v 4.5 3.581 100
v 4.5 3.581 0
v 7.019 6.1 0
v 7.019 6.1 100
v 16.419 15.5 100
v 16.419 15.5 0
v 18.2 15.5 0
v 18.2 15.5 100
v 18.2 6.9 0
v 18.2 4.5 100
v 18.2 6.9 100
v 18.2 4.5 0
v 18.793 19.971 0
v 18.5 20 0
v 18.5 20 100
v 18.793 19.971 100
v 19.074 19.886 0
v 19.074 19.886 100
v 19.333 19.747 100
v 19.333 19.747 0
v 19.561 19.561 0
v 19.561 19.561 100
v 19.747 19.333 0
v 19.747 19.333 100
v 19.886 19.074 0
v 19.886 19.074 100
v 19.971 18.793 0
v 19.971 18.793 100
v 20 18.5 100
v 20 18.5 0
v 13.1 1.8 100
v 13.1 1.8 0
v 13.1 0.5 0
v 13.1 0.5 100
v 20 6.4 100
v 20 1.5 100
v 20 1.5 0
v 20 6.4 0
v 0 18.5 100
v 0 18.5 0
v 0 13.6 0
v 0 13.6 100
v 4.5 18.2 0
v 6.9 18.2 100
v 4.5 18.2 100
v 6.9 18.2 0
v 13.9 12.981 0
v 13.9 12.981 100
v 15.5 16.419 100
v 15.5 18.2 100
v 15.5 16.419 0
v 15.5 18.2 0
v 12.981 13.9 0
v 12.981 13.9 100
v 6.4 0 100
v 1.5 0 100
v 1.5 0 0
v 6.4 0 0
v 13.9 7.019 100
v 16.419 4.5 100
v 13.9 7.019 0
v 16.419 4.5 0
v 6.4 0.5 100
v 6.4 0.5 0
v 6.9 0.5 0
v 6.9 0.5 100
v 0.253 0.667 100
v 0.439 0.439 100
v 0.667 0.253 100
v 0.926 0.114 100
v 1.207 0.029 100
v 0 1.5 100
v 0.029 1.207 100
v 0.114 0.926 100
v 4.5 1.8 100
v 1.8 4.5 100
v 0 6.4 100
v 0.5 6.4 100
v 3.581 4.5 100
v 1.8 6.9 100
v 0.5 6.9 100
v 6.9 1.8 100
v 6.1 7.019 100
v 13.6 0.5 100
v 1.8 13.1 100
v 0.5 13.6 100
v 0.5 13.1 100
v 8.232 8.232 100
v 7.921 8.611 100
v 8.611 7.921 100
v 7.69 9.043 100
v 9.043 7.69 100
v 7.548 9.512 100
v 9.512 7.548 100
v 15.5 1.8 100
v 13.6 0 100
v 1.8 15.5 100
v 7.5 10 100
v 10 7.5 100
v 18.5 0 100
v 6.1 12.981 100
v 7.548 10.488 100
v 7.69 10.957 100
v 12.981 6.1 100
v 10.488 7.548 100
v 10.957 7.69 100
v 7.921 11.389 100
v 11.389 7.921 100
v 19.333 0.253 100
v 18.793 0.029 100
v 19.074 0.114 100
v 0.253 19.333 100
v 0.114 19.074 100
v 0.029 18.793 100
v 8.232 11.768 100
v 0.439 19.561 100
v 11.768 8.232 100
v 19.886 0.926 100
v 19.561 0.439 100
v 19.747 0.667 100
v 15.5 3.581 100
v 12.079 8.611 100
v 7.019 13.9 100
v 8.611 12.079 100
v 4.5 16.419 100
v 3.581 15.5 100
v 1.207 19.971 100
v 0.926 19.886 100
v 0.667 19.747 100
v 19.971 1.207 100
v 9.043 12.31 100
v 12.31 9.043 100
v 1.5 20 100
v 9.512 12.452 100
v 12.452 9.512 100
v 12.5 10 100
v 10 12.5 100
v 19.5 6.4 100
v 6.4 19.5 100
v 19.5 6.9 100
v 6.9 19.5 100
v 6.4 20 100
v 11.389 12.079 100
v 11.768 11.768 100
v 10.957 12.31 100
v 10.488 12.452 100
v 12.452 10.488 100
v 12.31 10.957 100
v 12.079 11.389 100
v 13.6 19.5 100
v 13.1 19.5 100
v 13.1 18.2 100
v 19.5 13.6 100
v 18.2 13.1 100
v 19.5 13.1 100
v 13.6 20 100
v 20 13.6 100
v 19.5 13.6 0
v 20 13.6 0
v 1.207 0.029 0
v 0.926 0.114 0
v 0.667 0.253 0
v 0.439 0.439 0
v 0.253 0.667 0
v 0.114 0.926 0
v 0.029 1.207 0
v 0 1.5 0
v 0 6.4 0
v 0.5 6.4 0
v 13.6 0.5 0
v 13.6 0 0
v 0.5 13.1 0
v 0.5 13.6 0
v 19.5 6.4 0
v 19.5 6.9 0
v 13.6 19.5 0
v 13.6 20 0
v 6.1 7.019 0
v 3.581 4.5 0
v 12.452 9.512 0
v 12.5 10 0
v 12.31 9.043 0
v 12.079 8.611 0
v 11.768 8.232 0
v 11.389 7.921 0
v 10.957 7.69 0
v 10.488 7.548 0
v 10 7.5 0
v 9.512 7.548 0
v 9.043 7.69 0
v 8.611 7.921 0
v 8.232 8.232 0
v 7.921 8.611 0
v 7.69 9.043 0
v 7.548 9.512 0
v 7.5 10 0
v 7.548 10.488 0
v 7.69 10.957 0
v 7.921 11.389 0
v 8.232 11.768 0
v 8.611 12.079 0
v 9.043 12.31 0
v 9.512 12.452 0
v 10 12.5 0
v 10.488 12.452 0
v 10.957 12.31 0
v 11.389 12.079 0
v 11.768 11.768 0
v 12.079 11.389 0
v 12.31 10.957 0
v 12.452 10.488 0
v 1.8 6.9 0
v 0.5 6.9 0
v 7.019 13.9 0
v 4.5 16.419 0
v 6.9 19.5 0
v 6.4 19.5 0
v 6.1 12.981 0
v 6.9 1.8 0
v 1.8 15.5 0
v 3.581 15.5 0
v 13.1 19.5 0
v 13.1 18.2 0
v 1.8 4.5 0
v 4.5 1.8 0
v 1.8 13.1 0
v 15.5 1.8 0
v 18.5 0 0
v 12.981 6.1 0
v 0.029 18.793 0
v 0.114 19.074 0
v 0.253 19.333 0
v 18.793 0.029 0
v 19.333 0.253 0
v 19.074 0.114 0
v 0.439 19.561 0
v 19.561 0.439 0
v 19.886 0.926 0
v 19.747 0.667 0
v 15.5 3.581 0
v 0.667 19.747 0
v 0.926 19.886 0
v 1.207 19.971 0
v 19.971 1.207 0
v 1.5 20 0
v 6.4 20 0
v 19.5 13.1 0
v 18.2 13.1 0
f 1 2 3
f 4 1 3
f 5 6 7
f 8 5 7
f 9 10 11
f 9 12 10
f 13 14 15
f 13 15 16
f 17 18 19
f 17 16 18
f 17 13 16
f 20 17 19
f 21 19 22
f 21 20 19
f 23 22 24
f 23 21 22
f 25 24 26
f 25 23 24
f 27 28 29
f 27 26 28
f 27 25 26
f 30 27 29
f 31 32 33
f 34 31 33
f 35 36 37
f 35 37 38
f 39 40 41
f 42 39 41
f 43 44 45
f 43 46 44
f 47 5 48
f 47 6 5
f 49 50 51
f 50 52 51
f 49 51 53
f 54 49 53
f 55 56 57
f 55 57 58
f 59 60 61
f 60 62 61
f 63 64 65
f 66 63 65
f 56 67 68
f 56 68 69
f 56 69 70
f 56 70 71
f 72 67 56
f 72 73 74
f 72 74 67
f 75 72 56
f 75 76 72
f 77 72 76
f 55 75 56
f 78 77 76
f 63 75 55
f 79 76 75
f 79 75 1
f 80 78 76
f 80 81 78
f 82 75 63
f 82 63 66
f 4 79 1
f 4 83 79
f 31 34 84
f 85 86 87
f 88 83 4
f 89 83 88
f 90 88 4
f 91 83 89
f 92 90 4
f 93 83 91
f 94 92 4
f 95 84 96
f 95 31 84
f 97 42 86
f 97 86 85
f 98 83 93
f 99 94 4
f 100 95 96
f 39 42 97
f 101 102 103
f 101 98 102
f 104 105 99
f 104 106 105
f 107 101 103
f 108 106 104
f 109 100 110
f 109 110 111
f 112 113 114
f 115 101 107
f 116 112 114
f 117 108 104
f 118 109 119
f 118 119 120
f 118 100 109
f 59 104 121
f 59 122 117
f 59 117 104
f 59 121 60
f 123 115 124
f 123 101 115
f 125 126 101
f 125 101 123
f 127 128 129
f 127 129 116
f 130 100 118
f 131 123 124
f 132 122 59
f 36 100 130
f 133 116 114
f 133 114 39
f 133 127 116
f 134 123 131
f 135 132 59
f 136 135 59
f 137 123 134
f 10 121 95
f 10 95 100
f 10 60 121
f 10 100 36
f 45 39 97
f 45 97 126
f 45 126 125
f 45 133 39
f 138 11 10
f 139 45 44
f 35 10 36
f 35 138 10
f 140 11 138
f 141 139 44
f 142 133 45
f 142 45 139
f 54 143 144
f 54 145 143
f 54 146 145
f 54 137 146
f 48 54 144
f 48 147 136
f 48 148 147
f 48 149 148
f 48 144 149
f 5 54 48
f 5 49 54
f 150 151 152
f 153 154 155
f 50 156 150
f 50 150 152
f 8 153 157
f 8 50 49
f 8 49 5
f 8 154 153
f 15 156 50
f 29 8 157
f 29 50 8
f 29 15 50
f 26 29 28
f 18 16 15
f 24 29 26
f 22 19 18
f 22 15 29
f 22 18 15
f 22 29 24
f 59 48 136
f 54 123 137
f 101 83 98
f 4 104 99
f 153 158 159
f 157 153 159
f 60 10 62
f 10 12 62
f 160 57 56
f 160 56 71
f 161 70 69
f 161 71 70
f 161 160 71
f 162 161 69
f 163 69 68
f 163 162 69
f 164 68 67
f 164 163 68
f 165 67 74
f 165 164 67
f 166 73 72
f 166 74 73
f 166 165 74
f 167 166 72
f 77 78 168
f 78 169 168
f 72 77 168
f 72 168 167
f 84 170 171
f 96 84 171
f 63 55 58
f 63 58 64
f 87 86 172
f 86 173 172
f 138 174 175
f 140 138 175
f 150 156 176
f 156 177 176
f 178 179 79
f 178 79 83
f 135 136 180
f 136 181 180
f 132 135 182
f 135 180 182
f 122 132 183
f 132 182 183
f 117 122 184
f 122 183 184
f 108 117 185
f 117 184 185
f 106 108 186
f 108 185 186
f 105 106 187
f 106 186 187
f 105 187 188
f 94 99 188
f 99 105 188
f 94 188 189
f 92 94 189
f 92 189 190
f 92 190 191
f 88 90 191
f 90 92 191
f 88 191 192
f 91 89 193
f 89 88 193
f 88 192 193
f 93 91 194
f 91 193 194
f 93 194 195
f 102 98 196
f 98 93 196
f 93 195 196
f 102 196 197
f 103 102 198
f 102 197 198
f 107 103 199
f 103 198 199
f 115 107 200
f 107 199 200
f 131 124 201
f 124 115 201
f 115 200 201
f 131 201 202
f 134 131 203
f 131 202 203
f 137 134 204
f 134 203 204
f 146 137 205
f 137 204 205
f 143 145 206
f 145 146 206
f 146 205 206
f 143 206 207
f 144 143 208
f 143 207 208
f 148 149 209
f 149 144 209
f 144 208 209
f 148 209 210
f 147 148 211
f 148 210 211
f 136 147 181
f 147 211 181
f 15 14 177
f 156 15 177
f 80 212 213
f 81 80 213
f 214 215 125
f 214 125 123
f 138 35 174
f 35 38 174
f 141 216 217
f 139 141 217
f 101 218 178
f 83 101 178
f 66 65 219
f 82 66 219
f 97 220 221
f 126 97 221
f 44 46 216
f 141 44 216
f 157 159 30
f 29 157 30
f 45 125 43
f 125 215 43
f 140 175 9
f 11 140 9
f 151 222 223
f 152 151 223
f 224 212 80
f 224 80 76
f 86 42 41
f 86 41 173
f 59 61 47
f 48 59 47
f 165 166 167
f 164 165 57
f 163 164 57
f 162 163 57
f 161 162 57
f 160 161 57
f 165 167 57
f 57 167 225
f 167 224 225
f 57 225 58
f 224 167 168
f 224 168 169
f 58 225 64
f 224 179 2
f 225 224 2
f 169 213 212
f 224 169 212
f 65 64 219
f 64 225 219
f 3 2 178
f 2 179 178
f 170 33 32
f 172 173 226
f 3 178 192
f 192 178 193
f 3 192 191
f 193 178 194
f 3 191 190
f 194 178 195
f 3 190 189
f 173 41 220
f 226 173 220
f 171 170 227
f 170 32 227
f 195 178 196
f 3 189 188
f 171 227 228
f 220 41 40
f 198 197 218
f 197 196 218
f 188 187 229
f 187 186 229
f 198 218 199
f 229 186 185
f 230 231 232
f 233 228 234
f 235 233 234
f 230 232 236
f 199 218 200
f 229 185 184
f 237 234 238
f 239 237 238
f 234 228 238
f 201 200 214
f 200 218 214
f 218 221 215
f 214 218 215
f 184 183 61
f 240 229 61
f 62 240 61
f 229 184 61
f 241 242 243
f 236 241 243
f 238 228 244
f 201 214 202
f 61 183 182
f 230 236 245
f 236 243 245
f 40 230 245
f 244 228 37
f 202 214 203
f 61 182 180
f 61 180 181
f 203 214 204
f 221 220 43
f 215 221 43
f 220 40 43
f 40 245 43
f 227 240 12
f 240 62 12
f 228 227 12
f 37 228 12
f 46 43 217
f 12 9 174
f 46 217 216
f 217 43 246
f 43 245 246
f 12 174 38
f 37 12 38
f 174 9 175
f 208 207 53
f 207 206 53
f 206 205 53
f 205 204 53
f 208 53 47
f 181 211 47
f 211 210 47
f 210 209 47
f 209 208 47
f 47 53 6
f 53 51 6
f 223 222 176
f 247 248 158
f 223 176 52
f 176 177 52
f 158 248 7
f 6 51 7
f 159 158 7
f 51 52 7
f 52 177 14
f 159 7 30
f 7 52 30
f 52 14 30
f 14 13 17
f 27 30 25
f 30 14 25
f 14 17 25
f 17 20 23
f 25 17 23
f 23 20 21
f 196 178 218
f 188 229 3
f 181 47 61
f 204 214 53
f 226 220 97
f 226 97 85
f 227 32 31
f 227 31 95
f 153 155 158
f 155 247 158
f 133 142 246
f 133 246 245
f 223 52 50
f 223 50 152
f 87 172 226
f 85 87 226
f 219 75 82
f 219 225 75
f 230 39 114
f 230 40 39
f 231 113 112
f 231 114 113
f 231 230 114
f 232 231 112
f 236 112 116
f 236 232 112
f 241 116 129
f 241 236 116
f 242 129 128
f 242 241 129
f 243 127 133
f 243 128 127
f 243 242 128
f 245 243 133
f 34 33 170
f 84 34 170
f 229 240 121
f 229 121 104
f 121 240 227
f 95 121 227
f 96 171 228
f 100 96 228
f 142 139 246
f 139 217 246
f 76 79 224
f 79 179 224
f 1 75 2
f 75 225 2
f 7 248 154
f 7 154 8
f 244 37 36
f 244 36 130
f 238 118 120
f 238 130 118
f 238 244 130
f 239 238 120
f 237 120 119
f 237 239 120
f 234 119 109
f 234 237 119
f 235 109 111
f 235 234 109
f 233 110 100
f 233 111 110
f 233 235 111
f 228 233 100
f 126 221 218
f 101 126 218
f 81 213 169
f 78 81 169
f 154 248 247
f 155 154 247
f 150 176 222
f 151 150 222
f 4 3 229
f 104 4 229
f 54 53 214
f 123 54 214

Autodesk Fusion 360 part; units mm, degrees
sketch "Sketch1" plane through (0, 0, 0) normal (0, 0, 1) x (1, 0, 0)
  circle A0 centre (10, 10) radius 2.5
  line L0 (13.9, 6.1) -> (6.1, 13.9) construction
  line L1 (0, 6.4) -> (0, 1.5)
  line L2 (4.5, 1.8) -> (6.9, 1.8)
  line L3 (3.5808, 4.5) -> (6.1, 7.0192)
  line L4 (4.5, 3.5808) -> (7.0192, 6.1)
  line L5 (0.5, 6.9) -> (0.5, 6.4)
  line L6 (0.5, 6.4) -> (0, 6.4)
  line L7 (6.9, 0) -> (6.4, 0) construction
  line L8 (6.4, 0) -> (6.4, 0.5)
  line L9 (6.4, 0.5) -> (6.9, 0.5)
  arc A1 (0, 1.5) -> (1.5, 0) centre (1.5, 1.5) ccw
  line L10 (1.8, 6.9) -> (0.5, 6.9)
  line L11 (1.8, 6.9) -> (1.8, 6.4)
  line L12 (1.8, 6.4) -> (1.8, 4.5)
  line L13 (3.5808, 4.5) -> (1.8, 4.5)
  line L14 (6.1, 10) -> (6.1, 7.0192)
  line L15 (7.0192, 6.1) -> (10, 6.1)
  line L16 (4.5, 1.8) -> (4.5, 3.5808)
  line L17 (6.9, 0.5) -> (6.9, 1.8)
  line L18 (1.5, 0) -> (6.4, 0)
  line L19 (6.4, 0) -> (6.9, 0)
  line L20 (0, 6.9) -> (0, 6.4)
  line L21 (10, 13.9) -> (10, 6.1) construction
  line L22 (13.9, 10) -> (6.1, 10) construction
  line L23 (20, 6.4) -> (19.5, 6.4)
  line L24 (19.5, 6.4) -> (19.5, 6.9)
  line L25 (19.5, 6.9) -> (18.2, 6.9)
  line L26 (18.2, 4.5) -> (18.2, 6.9)
  line L27 (18.2, 4.5) -> (16.4192, 4.5)
  line L28 (16.4192, 4.5) -> (13.9, 7.0192)
  line L29 (13.9, 7.0192) -> (13.9, 10)
  line L30 (15.5, 3.5808) -> (12.9808, 6.1)
  line L31 (15.5, 3.5808) -> (15.5, 1.8)
  line L32 (13.6, 1.8) -> (15.5, 1.8)
  line L33 (13.1, 1.8) -> (13.6, 1.8)
  line L34 (13.1, 1.8) -> (13.1, 0.5)
  line L35 (13.1, 0.5) -> (13.6, 0.5)
  line L36 (13.6, 0.5) -> (13.6, 0)
  line L37 (10, 6.1) -> (12.9808, 6.1)
  line L38 (13.6, 0) -> (18.5, 0)
  arc A2 (18.5, 0) -> (20, 1.5) centre (18.5, 1.5) ccw
  line L39 (20, 1.5) -> (20, 6.4)
  line L40 (13.6, 20) -> (13.6, 19.5)
  line L41 (13.6, 19.5) -> (13.1, 19.5)
  line L42 (13.1, 19.5) -> (13.1, 18.2)
  line L43 (15.5, 18.2) -> (13.1, 18.2)
  line L44 (15.5, 18.2) -> (15.5, 16.4192)
  line L45 (15.5, 16.4192) -> (12.9808, 13.9)
  line L46 (12.9808, 13.9) -> (10, 13.9)
  line L47 (16.4192, 15.5) -> (13.9, 12.9808)
  line L48 (16.4192, 15.5) -> (18.2, 15.5)
  line L49 (18.2, 13.6) -> (18.2, 15.5)
  line L50 (18.2, 13.1) -> (18.2, 13.6)
  line L51 (18.2, 13.1) -> (19.5, 13.1)
  line L52 (19.5, 13.1) -> (19.5, 13.6)
  line L53 (19.5, 13.6) -> (20, 13.6)
  line L54 (13.9, 10) -> (13.9, 12.9808)
  line L55 (20, 13.6) -> (20, 18.5)
  arc A3 (20, 18.5) -> (18.5, 20) centre (18.5, 18.5) ccw
  line L56 (18.5, 20) -> (13.6, 20)
  line L57 (0, 13.6) -> (0.5, 13.6)
  line L58 (0.5, 13.6) -> (0.5, 13.1)
  line L59 (0.5, 13.1) -> (1.8, 13.1)
  line L60 (1.8, 15.5) -> (1.8, 13.1)
  line L61 (1.8, 15.5) -> (3.5808, 15.5)
  line L62 (3.5808, 15.5) -> (6.1, 12.9808)
  line L63 (6.1, 12.9808) -> (6.1, 10)
  line L64 (4.5, 16.4192) -> (7.0192, 13.9)
  line L65 (4.5, 16.4192) -> (4.5, 18.2)
  line L66 (6.4, 18.2) -> (4.5, 18.2)
  line L67 (6.9, 18.2) -> (6.4, 18.2)
  line L68 (6.9, 18.2) -> (6.9, 19.5)
  line L69 (6.9, 19.5) -> (6.4, 19.5)
  line L70 (6.4, 19.5) -> (6.4, 20)
  line L71 (10, 13.9) -> (7.0192, 13.9)
  line L72 (6.4, 20) -> (1.5, 20)
  arc A4 (1.5, 20) -> (0, 18.5) centre (1.5, 18.5) ccw
  line L73 (0, 18.5) -> (0, 13.6)
  arc A5 (26, 1.5) -> (27.5, 0) centre (27.5, 1.5) ccw
  line L74 (41.5, 3.5808) -> (41.5, 1.8)
  line L75 (39.1, 19.5) -> (39.1, 18.2)
  line L76 (32.4, 20) -> (27.5, 20)
  line L77 (26, 6.9) -> (26, 6.4)
  line L78 (29.5808, 4.5) -> (32.1, 7.0192)
  line L79 (29.5808, 15.5) -> (32.1, 12.9808)
  line L80 (26, 13.6) -> (26.5, 13.6)
  line L81 (39.1, 0.5) -> (39.6, 0.5)
  line L82 (30.5, 16.4192) -> (30.5, 18.2)
  line L83 (27.8, 15.5) -> (27.8, 13.1)
  line L84 (36, 13.9) -> (36, 6.1) construction
  line L85 (32.4, 0) -> (32.4, 0.5)
  line L86 (39.6, 0.5) -> (39.6, 0)
  line L87 (32.1, 10) -> (32.1, 7.0192)
  line L88 (32.4, 19.5) -> (32.4, 20)
  line L89 (39.1, 1.8) -> (39.6, 1.8)
  line L90 (27.8, 6.9) -> (27.8, 6.4)
  line L91 (41.5, 16.4192) -> (38.9808, 13.9)
  line L92 (26.5, 13.1) -> (27.8, 13.1)
  line L93 (26.5, 6.4) -> (26, 6.4)
  line L94 (32.1, 12.9808) -> (32.1, 10)
  line L95 (27.5, 0) -> (32.4, 0)
  line L96 (32.9, 0.5) -> (32.9, 1.8)
  line L97 (32.9, 0) -> (32.4, 0) construction
  line L98 (30.5, 1.8) -> (30.5, 3.5808)
  line L99 (32.9, 19.5) -> (32.4, 19.5)
  line L100 (32.9, 18.2) -> (32.4, 18.2)
  line L101 (41.5, 18.2) -> (39.1, 18.2)
  line L102 (39.6, 19.5) -> (39.1, 19.5)
  line L103 (27.8, 6.9) -> (26.5, 6.9)
  line L104 (27.8, 15.5) -> (29.5808, 15.5)
  line L105 (36, 13.9) -> (33.0192, 13.9)
  line L106 (33.0192, 6.1) -> (36, 6.1)
  line L107 (41.5, 18.2) -> (41.5, 16.4192)
  line L108 (39.9, 10) -> (32.1, 10) construction
  line L109 (39.6, 1.8) -> (41.5, 1.8)
  line L110 (39.9, 6.1) -> (32.1, 13.9) construction
  line L111 (39.6, 0) -> (44.5, 0)
  line L112 (36, 6.1) -> (38.9808, 6.1)
  circle A6 centre (36, 10) radius 2.5
  line L113 (42.4192, 4.5) -> (39.9, 7.0192)
  line L114 (38.9808, 13.9) -> (36, 13.9)
  line L115 (41.5, 3.5808) -> (38.9808, 6.1)
  line L116 (39.9, 7.0192) -> (39.9, 10)
  line L117 (39.9, 10) -> (39.9, 12.9808)
  line L118 (30.5, 16.4192) -> (33.0192, 13.9)
  line L119 (42.4192, 15.5) -> (39.9, 12.9808)
  line L120 (26, 18.5) -> (26, 13.6)
  line L121 (39.6, 20) -> (39.6, 19.5)
  line L122 (32.4, 18.2) -> (30.5, 18.2)
  line L123 (26.5, 6.9) -> (26.5, 6.4)
  line L124 (39.1, 1.8) -> (39.1, 0.5)
  arc A7 (27.5, 20) -> (26, 18.5) centre (27.5, 18.5) ccw
  line L125 (44.5, 20) -> (39.6, 20)
  line L126 (26, 6.4) -> (26, 1.5)
  line L127 (30.5, 3.5808) -> (33.0192, 6.1)
  line L128 (32.4, 0) -> (32.9, 0)
  line L129 (32.4, 0.5) -> (32.9, 0.5)
  line L130 (29.5808, 4.5) -> (27.8, 4.5)
  line L131 (27.8, 6.4) -> (27.8, 4.5)
  line L132 (30.5, 1.8) -> (32.9, 1.8)
  line L133 (26.5, 13.6) -> (26.5, 13.1)
  line L134 (32.9, 18.2) -> (32.9, 19.5)
  line L135 (59.9, 6.1) -> (52.1, 13.9) construction
  circle A8 centre (56, 10) radius 2.5
  line L136 (56, 13.9) -> (56, 6.1) construction
  line L137 (66, 13.6) -> (66, 18.5)
  line L138 (61.5, 16.4192) -> (58.9808, 13.9)
  line L139 (59.9, 10) -> (59.9, 12.9808)
  line L140 (64.2, 13.1) -> (65.5, 13.1)
  line L141 (59.6, 20) -> (59.6, 19.5)
  line L142 (52.1, 12.9808) -> (52.1, 10)
  line L143 (59.1, 19.5) -> (59.1, 18.2)
  line L144 (64.2, 13.1) -> (64.2, 13.6)
  line L145 (64.2, 13.6) -> (64.2, 15.5)
  line L146 (59.9, 10) -> (52.1, 10) construction
  line L147 (65.5, 13.1) -> (65.5, 13.6)
  line L148 (64.5, 20) -> (59.6, 20)
  line L149 (49.5808, 15.5) -> (52.1, 12.9808)
  line L150 (52.4, 19.5) -> (52.4, 20)
  line L151 (62.4192, 15.5) -> (64.2, 15.5)
  line L152 (59.1, 0.5) -> (59.6, 0.5)
  line L153 (65.5, 13.6) -> (66, 13.6)
  line L154 (50.5, 16.4192) -> (53.0192, 13.9)
  line L155 (61.5, 18.2) -> (61.5, 16.4192)
  line L156 (53.0192, 6.1) -> (56, 6.1)
  line L157 (50.5, 16.4192) -> (50.5, 18.2)
  line L158 (52.4, 0.5) -> (52.9, 0.5)
  line L159 (59.1, 1.8) -> (59.6, 1.8)
  line L160 (49.5808, 4.5) -> (52.1, 7.0192)
  line L161 (50.5, 1.8) -> (50.5, 3.5808)
  line L162 (61.5, 3.5808) -> (61.5, 1.8)
  line L163 (56, 13.9) -> (53.0192, 13.9)
  line L164 (52.4, 0) -> (52.4, 0.5)
  line L165 (50.5, 3.5808) -> (53.0192, 6.1)
  line L166 (66, 1.5) -> (66, 6.4)
  line L167 (59.6, 1.8) -> (61.5, 1.8)
  arc A9 (66, 18.5) -> (64.5, 20) centre (64.5, 18.5) ccw
  line L168 (52.1, 10) -> (52.1, 7.0192)
  line L169 (64.2, 4.5) -> (62.4192, 4.5)
  line L170 (59.6, 19.5) -> (59.1, 19.5)
  line L171 (61.5, 18.2) -> (59.1, 18.2)
  line L172 (61.5, 3.5808) -> (58.9808, 6.1)
  line L173 (52.9, 0) -> (52.4, 0) construction
  line L174 (59.9, 7.0192) -> (59.9, 10)
  line L175 (52.4, 18.2) -> (50.5, 18.2)
  line L176 (59.6, 0.5) -> (59.6, 0)
  line L177 (52.9, 18.2) -> (52.4, 18.2)
  line L178 (66, 6.4) -> (65.5, 6.4)
  line L179 (56, 6.1) -> (58.9808, 6.1)
  line L180 (52.9, 18.2) -> (52.9, 19.5)
  line L181 (59.6, 0) -> (64.5, 0)
  line L182 (62.4192, 4.5) -> (59.9, 7.0192)
  arc A10 (64.5, 0) -> (66, 1.5) centre (64.5, 1.5) ccw
  line L183 (50.5, 1.8) -> (52.9, 1.8)
  line L184 (52.4, 20) -> (47.5, 20)
  line L185 (64.2, 4.5) -> (64.2, 6.9)
  line L186 (65.5, 6.4) -> (65.5, 6.9)
  line L187 (52.4, 0) -> (52.9, 0)
  line L188 (52.9, 19.5) -> (52.4, 19.5)
  line L189 (65.5, 6.9) -> (64.2, 6.9)
  line L190 (59.1, 1.8) -> (59.1, 0.5)
  line L191 (47.5, 0) -> (52.4, 0)
  line L192 (58.9808, 13.9) -> (56, 13.9)
  line L193 (62.4192, 15.5) -> (59.9, 12.9808)
  line L194 (52.9, 0.5) -> (52.9, 1.8)
  line L195 (44.5, 20) -> (47.5, 20)
  line L196 (44.5, 0) -> (47.5, 0)
  line L197 (41.5, 18.2) -> (42.8, 18.2) construction
  line L198 (42.8, 18.2) -> (49.2, 18.2)
  line L199 (49.2, 1.8) -> (42.8, 1.8)
  line L200 (42.4192, 15.5) -> (42.8, 15.8808)
  line L201 (49.5808, 15.5) -> (49.2, 15.8808)
  line L202 (49.5808, 4.5) -> (49.2, 4.1192)
  line L203 (42.4192, 4.5) -> (42.8, 4.1192)
  line L204 (42.8, 15.8808) -> (42.8, 18.2)
  line L205 (49.2, 18.2) -> (49.2, 15.8808)
  line L206 (49.2, 4.1192) -> (49.2, 1.8)
  line L207 (42.8, 1.8) -> (42.8, 4.1192)
  point P0 (10, 10)
  point P1 (36, 10)
  point P2 (56, 10)
  dimension "d3" = 5
  dimension "d6" = 6.9
  dimension "d7" = 6.9
  dimension "d14" = 6.4
  dimension "d22" = 0.5
  dimension "d23" = 0.5
  dimension "d24" = 0.5
  dimension "d25" = 0.5
  dimension "d26" = 1.5
  dimension "d28" = 360
  dimension "d30" = 360
  dimension "d31" = 5
  dimension "d32" = 0.5
  dimension "d33" = 0.5
  dimension "d34" = 0.5
  dimension "d35" = 0.5
  dimension "d36" = 1.5
  dimension "d39" = 5
  dimension "d42" = 0.5
  dimension "d43" = 0.5
  dimension "d45" = 1.3
  dimension "d47" = 6.4
extrude "Extrude1" add sketch "Sketch1" along normal blind 100 makes body 1 at (12.4876, 9.7511, 33.3333) makes body 2 at (38.4876, 9.7511, 33.3333)
hidden bodies 2
equation "d7 = 10 mm - 3.1 mm"
equation "d14 = 10 mm - 3.6 mm"
